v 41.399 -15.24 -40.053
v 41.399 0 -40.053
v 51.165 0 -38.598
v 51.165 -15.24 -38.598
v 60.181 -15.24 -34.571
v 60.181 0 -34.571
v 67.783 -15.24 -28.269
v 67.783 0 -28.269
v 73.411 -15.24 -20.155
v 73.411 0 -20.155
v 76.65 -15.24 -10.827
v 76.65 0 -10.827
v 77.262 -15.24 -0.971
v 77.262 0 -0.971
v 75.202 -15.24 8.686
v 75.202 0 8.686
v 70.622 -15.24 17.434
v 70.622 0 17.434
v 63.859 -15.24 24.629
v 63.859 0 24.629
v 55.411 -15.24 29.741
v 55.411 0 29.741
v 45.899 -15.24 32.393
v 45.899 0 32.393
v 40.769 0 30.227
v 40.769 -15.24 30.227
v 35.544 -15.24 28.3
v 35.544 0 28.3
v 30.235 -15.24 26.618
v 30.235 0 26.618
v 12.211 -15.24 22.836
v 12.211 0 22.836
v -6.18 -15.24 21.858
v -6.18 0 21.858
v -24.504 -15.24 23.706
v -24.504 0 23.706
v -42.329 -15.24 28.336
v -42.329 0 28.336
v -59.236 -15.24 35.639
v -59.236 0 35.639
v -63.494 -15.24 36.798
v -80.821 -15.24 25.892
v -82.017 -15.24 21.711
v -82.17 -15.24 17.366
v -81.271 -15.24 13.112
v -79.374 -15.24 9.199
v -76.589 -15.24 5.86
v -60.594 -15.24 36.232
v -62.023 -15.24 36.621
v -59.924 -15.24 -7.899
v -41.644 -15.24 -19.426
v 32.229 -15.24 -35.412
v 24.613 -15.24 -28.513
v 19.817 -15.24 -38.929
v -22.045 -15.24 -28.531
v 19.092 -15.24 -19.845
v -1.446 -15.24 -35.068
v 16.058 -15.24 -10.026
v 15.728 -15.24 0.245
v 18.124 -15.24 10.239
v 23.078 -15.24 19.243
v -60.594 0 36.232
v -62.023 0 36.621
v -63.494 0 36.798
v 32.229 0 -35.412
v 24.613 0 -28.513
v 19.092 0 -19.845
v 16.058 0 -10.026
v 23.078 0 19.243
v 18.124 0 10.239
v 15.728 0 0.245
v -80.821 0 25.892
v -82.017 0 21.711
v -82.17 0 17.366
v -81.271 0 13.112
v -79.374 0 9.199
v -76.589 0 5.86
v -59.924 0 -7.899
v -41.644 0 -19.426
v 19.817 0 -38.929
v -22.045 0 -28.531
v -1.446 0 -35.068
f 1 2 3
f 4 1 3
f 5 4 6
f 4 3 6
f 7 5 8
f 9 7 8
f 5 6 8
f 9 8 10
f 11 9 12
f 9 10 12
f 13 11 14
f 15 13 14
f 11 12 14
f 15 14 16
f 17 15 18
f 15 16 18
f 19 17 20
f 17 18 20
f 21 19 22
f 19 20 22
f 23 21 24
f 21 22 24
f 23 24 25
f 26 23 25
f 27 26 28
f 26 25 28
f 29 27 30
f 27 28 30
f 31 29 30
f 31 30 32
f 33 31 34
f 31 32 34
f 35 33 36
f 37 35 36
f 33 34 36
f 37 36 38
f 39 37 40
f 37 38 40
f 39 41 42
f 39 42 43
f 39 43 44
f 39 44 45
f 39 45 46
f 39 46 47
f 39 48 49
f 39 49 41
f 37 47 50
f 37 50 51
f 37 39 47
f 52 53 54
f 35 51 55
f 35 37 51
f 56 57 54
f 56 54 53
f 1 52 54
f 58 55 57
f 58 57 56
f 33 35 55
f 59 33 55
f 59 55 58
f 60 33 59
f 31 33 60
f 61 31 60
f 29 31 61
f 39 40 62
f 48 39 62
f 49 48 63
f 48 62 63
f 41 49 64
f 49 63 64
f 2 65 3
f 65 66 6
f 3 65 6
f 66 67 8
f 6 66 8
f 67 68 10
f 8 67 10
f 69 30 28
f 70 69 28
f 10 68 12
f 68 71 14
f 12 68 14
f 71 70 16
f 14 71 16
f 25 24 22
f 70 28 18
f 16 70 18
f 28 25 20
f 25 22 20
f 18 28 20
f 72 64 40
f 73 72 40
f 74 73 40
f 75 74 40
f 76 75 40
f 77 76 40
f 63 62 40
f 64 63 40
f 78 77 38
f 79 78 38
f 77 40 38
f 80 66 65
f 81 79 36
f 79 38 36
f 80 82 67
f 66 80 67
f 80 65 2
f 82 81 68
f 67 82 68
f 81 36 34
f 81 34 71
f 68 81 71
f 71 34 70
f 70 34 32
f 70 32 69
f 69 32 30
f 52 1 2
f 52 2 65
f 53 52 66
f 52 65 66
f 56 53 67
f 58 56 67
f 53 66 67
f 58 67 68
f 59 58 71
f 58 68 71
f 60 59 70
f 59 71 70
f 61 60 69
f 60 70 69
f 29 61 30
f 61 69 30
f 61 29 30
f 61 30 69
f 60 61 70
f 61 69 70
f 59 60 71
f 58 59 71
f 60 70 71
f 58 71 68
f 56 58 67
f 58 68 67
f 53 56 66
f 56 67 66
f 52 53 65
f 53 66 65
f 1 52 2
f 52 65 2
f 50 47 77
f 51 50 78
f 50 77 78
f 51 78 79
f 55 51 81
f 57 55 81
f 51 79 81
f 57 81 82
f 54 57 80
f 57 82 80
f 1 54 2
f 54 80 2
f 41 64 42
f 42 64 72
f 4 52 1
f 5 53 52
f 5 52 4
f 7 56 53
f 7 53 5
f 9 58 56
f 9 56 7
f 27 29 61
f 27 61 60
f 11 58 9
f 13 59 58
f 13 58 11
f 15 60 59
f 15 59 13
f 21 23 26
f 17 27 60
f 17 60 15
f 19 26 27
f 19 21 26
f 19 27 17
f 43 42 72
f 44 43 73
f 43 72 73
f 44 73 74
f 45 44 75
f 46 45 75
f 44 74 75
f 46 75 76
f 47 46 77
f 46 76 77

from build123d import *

# Parameters (mm, degrees)
F1_DEPTH = 15.24
F2_DEPTH = 15.24


with BuildPart() as f1:
    # F0 (on Front) → F1 (new body)
    with BuildSketch(Plane.XZ):
        with BuildLine():
            Line((-63.493849, 36.797924), (-80.820679, 25.891539))
            ThreePointArc((-80.820679, 25.891539), (-81.850308, 15.211303), (-76.589, 5.860035))
            ThreePointArc((-76.589, 5.860035), (-22.044712, -28.53109), (41.398747, -40.053079))
            ThreePointArc((41.398747, -40.053079), (16.057753, -10.026182), (30.23501, 26.617862))
            ThreePointArc((30.23501, 26.617862), (-15.377662, 22.429645), (-59.236111, 35.63924))
            ThreePointArc((-59.236111, 35.63924), (-61.301317, 36.45252), (-63.493849, 36.797924))
        make_face()
    extrude(amount=F1_DEPTH)


with BuildPart() as f2:
    # F0 (on Front) → F2 (new body)
    with BuildSketch(Plane.XZ):
        with BuildLine():
            ThreePointArc((30.23501, 26.617862), (16.057753, -10.026182), (41.398747, -40.053079))
            ThreePointArc((41.398747, -40.053079), (77.291588, -5.919742), (45.899271, 32.393483))
            ThreePointArc((45.899271, 32.393483), (38.167717, 29.232894), (30.23501, 26.617862))
        make_face()
    extrude(amount=F2_DEPTH)


solid = Compound([f1.part, f2.part])
